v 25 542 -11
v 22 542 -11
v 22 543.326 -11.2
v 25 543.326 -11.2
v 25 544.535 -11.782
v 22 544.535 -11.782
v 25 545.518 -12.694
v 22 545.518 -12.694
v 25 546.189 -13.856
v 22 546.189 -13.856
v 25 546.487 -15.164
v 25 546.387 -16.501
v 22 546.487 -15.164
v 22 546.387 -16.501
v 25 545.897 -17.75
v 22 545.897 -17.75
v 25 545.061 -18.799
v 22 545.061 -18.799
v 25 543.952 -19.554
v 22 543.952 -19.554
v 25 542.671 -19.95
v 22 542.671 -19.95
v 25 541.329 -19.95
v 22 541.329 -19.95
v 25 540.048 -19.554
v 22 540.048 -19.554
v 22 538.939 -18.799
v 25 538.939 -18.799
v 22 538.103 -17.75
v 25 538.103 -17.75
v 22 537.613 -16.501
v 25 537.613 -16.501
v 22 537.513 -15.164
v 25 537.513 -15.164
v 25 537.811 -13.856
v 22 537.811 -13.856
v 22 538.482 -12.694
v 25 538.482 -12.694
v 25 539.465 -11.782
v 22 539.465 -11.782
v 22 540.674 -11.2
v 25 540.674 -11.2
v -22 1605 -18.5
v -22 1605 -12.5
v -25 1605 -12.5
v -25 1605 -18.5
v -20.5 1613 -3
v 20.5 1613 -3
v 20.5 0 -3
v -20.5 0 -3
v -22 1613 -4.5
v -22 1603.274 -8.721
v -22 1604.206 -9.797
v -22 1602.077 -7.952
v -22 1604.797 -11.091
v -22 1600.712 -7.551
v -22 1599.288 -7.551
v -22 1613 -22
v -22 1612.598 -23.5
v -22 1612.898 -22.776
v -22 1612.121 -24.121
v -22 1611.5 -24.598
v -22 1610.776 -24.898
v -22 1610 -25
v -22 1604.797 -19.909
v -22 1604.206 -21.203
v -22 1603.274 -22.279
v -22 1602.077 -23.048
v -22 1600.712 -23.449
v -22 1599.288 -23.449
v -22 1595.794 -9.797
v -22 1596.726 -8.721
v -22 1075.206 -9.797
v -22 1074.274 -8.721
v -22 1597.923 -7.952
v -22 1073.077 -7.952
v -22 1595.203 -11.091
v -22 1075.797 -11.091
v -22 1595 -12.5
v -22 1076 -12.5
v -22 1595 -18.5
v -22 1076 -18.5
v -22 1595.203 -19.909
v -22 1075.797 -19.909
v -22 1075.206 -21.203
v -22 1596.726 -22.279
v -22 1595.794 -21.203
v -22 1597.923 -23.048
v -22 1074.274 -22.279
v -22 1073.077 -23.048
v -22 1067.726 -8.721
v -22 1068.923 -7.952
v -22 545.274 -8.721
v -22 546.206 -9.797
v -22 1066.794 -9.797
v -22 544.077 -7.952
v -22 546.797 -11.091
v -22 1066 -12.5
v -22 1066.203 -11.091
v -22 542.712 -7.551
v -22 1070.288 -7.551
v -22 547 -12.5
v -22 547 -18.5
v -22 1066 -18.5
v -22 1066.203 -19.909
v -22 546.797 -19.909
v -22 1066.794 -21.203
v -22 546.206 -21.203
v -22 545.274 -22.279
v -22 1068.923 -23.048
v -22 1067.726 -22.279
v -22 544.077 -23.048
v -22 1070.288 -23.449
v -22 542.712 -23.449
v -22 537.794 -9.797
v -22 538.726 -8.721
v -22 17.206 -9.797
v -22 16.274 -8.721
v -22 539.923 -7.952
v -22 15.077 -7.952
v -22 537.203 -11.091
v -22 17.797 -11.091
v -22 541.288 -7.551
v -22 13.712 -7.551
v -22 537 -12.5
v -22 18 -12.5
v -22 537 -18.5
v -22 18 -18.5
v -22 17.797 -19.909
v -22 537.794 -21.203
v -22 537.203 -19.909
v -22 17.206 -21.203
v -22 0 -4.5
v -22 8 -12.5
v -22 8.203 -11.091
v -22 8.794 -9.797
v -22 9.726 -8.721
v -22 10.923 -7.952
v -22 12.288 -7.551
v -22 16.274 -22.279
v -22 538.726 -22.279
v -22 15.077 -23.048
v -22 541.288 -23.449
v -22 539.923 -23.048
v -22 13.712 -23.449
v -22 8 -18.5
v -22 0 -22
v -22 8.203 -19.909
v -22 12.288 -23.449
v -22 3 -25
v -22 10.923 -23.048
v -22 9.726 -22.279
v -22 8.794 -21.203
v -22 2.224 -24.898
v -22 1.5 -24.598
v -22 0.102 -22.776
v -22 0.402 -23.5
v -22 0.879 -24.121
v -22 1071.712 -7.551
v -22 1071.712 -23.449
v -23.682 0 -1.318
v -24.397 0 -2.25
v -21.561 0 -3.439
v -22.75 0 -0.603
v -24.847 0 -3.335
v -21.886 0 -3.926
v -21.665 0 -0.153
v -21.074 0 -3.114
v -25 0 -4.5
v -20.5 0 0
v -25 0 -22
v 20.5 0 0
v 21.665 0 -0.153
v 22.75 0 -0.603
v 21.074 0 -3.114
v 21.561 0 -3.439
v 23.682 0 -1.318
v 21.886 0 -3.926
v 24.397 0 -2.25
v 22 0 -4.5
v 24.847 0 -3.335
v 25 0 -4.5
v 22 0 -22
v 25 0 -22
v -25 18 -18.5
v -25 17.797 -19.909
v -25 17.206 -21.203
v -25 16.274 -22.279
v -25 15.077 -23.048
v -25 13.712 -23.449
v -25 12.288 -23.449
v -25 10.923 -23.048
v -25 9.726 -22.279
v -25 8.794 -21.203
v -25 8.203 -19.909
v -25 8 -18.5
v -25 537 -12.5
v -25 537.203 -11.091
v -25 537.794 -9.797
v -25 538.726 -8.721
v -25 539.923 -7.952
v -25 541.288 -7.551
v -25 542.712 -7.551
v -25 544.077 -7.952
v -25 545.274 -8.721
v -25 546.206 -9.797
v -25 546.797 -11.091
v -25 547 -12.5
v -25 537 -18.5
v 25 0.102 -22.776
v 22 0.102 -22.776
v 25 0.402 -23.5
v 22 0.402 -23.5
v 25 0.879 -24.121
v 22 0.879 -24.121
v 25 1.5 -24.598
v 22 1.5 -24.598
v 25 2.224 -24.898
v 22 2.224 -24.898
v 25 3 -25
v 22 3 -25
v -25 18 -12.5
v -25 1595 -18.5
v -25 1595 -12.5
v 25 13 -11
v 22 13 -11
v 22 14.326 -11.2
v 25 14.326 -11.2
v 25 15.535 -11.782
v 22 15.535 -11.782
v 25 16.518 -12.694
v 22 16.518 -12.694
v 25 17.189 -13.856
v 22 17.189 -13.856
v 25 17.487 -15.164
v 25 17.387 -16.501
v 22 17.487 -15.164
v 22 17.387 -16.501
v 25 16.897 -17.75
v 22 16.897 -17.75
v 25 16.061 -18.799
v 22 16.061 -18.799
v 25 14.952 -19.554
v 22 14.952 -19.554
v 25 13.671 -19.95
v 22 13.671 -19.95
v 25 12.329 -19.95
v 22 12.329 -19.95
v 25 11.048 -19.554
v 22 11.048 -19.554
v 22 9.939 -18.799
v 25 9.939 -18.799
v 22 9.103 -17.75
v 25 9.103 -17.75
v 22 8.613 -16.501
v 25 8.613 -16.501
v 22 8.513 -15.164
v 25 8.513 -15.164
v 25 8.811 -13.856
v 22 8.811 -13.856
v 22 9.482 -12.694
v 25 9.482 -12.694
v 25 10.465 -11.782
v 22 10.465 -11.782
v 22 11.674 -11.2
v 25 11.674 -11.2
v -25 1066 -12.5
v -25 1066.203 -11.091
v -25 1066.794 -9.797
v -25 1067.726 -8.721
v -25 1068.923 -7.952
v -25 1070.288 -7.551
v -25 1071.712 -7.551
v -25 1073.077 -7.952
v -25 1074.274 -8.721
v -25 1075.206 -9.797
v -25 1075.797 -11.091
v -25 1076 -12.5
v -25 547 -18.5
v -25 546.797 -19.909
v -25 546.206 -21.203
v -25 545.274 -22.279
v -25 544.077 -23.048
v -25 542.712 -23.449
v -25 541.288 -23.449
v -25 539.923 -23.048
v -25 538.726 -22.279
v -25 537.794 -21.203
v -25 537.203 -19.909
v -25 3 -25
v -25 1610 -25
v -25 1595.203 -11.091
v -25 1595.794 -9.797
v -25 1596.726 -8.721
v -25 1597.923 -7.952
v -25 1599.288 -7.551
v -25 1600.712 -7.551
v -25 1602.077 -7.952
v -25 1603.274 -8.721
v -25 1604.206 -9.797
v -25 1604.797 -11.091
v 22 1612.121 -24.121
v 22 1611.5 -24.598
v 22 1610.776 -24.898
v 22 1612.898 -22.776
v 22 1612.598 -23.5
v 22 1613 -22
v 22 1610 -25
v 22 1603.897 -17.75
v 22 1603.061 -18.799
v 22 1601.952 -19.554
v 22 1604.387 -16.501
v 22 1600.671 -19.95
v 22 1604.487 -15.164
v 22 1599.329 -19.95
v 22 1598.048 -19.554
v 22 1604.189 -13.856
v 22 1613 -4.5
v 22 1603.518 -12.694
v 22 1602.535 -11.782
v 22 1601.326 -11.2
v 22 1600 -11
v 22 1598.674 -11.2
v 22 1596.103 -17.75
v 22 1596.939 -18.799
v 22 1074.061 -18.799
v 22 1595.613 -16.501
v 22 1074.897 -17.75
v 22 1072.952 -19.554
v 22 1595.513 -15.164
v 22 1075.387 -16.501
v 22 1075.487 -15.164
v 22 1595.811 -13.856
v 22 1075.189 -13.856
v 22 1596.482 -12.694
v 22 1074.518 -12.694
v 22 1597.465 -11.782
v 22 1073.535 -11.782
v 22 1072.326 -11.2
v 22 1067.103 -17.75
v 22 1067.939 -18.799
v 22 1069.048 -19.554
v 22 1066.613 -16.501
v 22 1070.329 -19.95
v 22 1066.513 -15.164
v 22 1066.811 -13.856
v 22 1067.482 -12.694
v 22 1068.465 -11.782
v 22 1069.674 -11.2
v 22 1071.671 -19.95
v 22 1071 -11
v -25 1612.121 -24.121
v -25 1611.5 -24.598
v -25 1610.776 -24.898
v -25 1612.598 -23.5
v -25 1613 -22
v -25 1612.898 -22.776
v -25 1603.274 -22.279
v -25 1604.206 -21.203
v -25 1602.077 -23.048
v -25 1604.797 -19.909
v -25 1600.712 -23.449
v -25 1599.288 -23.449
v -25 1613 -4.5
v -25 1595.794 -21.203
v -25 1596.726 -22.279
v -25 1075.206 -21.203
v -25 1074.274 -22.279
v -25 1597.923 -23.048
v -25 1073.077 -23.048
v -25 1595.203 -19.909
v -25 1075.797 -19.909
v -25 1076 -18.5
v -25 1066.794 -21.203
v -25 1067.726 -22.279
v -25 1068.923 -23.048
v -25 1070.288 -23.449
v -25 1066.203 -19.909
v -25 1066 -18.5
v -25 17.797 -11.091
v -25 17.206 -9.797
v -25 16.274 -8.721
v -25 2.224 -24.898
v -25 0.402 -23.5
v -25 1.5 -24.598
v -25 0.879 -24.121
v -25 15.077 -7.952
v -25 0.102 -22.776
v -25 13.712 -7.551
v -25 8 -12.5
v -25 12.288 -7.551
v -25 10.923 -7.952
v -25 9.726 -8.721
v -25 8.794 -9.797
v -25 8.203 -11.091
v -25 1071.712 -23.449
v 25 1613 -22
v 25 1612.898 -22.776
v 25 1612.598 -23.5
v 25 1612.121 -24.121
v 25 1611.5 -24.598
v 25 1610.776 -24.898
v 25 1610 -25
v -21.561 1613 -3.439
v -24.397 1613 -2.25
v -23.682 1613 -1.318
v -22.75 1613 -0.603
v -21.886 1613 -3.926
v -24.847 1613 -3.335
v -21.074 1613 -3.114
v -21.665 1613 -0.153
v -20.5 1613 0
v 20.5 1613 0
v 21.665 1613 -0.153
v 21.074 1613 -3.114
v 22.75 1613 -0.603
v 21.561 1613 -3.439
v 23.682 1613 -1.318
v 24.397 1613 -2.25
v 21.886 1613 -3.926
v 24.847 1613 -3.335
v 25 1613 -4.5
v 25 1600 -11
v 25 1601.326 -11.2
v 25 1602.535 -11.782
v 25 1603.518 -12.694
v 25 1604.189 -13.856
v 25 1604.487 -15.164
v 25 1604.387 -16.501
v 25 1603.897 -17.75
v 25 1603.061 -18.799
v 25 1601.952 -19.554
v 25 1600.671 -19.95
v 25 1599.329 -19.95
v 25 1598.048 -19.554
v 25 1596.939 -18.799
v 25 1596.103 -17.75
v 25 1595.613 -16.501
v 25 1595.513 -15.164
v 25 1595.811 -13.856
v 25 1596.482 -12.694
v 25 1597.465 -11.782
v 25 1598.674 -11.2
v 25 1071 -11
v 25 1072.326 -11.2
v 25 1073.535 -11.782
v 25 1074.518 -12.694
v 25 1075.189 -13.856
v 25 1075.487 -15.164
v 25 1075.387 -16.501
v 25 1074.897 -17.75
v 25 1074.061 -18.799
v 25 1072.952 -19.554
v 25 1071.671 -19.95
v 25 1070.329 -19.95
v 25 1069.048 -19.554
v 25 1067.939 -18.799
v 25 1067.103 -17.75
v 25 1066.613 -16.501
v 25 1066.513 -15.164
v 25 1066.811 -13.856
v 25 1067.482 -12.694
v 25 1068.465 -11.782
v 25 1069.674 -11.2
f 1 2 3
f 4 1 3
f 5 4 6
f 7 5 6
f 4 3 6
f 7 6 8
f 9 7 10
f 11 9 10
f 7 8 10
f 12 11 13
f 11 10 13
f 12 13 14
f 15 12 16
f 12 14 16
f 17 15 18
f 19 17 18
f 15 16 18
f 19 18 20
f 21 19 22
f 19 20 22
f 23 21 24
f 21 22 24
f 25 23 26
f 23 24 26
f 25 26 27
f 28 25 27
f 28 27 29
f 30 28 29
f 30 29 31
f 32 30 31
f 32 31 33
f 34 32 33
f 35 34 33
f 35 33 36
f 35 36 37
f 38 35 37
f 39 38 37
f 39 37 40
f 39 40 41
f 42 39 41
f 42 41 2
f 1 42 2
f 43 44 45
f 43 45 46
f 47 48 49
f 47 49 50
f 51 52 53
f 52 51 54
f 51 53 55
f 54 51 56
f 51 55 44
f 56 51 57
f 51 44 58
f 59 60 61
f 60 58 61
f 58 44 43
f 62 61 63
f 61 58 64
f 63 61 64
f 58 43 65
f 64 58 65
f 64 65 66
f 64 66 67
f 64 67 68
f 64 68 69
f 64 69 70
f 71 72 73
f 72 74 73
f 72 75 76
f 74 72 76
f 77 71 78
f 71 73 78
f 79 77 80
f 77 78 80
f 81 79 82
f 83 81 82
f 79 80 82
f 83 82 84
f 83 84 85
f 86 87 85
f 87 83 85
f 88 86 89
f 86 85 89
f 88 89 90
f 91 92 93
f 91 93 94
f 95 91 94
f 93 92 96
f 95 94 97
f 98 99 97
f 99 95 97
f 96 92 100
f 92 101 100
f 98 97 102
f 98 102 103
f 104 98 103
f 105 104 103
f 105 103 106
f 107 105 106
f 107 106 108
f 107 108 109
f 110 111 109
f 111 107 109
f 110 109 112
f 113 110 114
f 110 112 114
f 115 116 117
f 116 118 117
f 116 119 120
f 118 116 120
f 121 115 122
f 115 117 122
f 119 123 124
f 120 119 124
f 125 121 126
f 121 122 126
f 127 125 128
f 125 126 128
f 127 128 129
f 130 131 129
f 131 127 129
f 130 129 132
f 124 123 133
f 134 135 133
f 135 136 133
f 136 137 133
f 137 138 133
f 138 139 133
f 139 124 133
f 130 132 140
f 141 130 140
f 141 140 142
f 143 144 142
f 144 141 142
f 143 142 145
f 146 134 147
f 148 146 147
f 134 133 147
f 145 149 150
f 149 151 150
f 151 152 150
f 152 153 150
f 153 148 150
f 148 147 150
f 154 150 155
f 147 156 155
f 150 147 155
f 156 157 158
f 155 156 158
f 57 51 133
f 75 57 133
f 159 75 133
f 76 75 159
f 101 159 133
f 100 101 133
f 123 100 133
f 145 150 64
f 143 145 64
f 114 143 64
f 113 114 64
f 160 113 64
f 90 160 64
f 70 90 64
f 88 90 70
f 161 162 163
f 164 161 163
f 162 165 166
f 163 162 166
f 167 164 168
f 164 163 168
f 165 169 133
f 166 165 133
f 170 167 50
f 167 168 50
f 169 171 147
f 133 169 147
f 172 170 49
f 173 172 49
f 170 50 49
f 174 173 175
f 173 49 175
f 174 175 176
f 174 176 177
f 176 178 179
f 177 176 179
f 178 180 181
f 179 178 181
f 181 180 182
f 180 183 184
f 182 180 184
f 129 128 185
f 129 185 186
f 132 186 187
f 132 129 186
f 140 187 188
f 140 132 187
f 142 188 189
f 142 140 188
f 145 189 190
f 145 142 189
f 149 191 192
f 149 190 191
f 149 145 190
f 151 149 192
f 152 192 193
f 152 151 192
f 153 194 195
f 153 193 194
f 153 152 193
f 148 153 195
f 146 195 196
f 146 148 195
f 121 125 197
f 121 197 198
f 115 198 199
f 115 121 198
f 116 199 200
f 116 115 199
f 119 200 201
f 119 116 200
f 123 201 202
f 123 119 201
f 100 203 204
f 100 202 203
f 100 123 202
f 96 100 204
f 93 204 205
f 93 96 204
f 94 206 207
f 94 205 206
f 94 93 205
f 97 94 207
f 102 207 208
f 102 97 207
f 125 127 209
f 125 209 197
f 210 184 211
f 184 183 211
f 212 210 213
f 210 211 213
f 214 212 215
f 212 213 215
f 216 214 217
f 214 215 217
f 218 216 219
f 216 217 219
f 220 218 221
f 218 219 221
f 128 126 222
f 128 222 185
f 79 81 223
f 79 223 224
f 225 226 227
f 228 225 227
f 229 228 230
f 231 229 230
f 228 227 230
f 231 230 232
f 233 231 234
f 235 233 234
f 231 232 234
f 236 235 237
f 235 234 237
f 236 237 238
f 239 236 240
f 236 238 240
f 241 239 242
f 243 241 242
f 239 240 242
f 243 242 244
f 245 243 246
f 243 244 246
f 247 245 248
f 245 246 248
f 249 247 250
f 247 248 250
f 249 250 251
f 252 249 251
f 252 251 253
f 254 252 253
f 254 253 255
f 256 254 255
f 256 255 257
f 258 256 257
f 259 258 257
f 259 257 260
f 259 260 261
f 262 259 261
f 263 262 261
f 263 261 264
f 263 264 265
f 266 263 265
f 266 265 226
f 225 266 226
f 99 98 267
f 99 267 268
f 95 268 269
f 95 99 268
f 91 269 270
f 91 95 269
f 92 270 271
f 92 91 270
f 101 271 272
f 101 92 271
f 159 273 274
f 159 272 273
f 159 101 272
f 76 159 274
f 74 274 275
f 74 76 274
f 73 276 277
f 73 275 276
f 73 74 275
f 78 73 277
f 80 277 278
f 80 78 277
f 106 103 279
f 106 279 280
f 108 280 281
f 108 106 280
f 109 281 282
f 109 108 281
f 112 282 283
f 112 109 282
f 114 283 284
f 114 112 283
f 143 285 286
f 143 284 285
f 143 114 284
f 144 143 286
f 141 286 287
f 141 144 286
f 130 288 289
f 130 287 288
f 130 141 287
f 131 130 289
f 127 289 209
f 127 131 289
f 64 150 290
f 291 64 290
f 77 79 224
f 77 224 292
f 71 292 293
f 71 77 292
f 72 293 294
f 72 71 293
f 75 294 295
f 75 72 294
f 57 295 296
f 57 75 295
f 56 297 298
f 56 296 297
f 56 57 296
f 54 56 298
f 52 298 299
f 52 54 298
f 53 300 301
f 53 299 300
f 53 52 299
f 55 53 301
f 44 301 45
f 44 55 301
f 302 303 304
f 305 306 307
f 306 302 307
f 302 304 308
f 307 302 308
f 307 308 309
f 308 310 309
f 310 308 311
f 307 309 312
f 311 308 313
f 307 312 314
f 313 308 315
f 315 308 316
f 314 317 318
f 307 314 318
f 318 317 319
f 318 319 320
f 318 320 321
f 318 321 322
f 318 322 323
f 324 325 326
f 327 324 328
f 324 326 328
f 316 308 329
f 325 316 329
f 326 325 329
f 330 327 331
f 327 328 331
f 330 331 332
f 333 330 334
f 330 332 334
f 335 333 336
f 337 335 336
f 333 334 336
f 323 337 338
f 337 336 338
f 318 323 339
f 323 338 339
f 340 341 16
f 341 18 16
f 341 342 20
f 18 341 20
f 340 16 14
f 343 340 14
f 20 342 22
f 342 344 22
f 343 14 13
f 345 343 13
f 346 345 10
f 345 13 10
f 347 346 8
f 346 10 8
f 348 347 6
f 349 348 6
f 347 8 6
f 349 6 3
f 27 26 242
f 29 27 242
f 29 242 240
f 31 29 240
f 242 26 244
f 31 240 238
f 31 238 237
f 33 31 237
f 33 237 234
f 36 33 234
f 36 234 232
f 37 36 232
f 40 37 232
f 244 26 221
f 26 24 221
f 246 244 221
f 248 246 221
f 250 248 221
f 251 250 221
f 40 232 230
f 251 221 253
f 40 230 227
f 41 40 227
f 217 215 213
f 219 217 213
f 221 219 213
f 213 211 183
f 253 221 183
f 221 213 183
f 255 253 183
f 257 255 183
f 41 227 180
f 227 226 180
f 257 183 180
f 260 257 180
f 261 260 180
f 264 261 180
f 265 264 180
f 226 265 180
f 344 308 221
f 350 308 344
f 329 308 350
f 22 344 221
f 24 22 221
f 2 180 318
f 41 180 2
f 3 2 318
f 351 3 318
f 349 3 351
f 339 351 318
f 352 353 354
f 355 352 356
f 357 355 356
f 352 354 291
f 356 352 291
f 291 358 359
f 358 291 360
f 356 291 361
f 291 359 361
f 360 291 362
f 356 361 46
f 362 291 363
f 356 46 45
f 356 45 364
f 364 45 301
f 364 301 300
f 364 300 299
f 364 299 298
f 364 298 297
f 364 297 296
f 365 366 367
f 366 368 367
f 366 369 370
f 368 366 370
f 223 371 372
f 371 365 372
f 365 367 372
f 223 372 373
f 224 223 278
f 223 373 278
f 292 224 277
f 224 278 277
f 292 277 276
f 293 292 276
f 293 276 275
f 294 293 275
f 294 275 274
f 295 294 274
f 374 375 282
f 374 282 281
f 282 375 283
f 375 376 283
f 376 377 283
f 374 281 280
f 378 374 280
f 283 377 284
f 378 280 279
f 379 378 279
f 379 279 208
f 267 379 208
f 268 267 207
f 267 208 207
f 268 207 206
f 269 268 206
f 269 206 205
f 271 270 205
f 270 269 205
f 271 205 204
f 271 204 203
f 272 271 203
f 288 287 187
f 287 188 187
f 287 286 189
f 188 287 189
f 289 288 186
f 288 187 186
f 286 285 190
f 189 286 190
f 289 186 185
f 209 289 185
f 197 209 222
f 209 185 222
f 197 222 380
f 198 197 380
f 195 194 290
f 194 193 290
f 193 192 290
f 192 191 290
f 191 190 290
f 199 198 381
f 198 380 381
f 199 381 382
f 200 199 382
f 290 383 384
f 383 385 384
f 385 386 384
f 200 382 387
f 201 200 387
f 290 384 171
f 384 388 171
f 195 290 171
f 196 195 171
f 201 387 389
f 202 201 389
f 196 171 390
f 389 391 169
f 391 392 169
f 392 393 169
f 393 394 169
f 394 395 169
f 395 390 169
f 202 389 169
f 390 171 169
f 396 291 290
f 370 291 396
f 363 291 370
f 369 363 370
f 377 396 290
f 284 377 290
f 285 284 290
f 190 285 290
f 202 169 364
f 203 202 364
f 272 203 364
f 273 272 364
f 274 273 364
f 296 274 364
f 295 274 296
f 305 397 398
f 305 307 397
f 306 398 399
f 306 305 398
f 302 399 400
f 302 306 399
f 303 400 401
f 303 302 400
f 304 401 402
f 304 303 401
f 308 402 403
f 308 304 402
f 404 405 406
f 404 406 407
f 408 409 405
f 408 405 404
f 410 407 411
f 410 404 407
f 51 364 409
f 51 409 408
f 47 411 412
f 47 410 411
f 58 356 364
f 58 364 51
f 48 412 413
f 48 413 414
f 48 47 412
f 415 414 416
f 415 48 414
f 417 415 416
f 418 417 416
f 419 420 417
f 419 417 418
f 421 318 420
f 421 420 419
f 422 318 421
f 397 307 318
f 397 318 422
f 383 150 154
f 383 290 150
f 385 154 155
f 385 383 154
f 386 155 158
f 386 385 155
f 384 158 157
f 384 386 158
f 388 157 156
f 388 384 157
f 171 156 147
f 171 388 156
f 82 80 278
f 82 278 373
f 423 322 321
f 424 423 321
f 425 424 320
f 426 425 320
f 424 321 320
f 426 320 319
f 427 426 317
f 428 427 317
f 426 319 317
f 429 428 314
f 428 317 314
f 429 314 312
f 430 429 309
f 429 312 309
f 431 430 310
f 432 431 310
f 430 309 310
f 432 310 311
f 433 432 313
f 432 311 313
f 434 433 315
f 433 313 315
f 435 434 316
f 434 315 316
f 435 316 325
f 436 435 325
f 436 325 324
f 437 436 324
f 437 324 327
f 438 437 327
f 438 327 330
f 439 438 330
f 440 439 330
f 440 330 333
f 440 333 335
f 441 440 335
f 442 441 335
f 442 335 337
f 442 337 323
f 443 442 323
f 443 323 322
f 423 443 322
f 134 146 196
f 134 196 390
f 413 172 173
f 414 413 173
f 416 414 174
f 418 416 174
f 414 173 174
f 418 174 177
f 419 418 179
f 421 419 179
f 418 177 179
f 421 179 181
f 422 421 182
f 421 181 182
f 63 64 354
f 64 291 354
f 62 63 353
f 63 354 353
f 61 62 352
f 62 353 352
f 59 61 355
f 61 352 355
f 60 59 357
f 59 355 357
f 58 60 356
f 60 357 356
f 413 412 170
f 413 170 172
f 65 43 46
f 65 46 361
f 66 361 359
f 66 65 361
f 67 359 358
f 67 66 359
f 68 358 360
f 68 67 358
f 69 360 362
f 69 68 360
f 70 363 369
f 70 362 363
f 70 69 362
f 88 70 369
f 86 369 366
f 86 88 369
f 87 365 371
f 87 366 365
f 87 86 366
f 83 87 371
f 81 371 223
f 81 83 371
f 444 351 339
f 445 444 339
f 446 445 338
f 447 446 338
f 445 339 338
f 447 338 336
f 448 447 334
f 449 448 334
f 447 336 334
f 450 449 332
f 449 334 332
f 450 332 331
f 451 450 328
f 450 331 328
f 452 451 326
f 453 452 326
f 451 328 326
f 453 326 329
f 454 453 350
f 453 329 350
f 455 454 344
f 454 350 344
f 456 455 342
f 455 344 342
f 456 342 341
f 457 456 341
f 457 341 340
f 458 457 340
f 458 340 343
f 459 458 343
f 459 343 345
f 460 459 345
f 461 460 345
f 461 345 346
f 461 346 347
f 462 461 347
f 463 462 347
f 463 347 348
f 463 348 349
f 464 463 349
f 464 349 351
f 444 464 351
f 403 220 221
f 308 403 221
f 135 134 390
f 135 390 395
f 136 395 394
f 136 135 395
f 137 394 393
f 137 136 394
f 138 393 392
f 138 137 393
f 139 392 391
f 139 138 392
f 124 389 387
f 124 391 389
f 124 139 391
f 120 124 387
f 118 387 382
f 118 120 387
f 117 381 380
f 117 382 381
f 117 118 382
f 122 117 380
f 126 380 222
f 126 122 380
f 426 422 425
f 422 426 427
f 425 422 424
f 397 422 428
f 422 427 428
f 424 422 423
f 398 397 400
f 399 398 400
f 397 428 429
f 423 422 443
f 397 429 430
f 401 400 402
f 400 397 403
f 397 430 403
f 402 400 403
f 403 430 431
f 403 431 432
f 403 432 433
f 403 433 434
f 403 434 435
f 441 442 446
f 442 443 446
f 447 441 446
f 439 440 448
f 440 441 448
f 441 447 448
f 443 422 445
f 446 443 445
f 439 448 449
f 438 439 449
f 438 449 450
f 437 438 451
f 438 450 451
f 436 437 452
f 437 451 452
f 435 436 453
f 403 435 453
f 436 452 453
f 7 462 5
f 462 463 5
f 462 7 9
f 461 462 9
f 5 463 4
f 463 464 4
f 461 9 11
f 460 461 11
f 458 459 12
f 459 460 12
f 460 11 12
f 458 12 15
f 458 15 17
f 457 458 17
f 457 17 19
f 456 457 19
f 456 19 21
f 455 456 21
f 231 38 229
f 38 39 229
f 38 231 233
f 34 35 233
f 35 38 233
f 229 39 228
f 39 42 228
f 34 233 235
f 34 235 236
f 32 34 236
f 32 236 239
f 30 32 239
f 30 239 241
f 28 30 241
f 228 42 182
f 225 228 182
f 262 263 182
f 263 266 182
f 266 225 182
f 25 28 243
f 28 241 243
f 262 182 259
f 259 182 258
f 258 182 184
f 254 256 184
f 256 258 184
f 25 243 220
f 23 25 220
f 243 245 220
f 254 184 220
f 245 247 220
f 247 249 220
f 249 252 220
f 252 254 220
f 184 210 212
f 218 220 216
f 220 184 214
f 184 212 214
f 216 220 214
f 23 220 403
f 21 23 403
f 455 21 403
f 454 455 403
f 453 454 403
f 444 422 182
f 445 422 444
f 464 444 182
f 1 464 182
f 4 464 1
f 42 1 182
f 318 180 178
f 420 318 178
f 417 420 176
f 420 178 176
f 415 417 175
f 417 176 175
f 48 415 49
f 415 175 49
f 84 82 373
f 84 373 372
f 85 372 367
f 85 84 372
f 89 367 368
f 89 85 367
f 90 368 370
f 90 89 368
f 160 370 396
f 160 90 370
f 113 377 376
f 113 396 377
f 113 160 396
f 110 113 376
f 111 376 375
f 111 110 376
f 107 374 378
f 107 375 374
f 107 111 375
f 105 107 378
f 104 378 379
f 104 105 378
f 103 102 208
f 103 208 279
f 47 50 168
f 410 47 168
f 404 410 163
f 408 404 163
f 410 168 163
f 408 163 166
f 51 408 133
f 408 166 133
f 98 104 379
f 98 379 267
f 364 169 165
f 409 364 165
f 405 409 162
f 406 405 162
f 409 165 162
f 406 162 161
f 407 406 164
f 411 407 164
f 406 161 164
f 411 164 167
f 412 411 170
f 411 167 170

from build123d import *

# Parameters (mm, degrees)
BASE_FLANGE1_DEPTH = 1613
CUT_EXTRUDE1_REACH = 1615.878
FILLET1_R          = 3
CUT_EXTRUDE2_REACH = 1615.878
SKETCH7_R          = 4.5
LPATTERN1_COUNT    = 4
LPATTERN1_PITCH    = 529


# Sheet-metal steps are written as plain solids
with BuildPart() as part:
    # Sketch1 → Base-Flange1 (new body)
    with BuildSketch(Plane(origin=(0, 0, 0), x_dir=(1, 0, 0), z_dir=(0, 1, 0))):
        with BuildLine():
            Line((-25, 25), (-25, 4.5))
            ThreePointArc((-25, 4.5), (-23.681980515, 1.318019485), (-20.5, 0))
            Line((-20.5, 0), (20.5, 0))
            ThreePointArc((20.5, 0), (23.681980515, 1.318019485), (25, 4.5))
            Line((25, 4.5), (25, 25))
            Line((25, 25), (22, 25))
            Line((22, 25), (22, 4.5))
            ThreePointArc((22, 4.5), (21.560660172, 3.439339828), (20.5, 3))
            Line((20.5, 3), (-20.5, 3))
            ThreePointArc((-20.5, 3), (-21.560660172, 3.439339828), (-22, 4.5))
            Line((-22, 4.5), (-22, 25))
            Line((-22, 25), (-25, 25))
        make_face()
    extrude(amount=BASE_FLANGE1_DEPTH)

    # Sketch6 → Cut-Extrude1 (cut, up to next)
    with BuildSketch(Plane(origin=(-22, 0, 0), x_dir=(0, 0, -1), z_dir=(1, 0, 0)), mode=Mode.PRIVATE) as cut_extrude1_sk1:
        with BuildLine():
            Line((12.5, 18), (18.5, 18))
            ThreePointArc((18.5, 18), (23.5, 13), (18.5, 8))
            Line((18.5, 8), (12.5, 8))
            ThreePointArc((12.5, 8), (7.5, 13), (12.5, 18))
        make_face()
    cut_extrude1_tool1 = extrude(cut_extrude1_sk1.sketch, amount=-CUT_EXTRUDE1_REACH, mode=Mode.PRIVATE) & part.part
    cut_extrude1 = cut_extrude1_tool1.solids().sort_by_distance((-22, 13, -15.5))[0]
    add(cut_extrude1, mode=Mode.SUBTRACT)

    # Fillet1
    fillet1_edges = [part.edges().sort_by_distance(p)[0] for p in [
        (23.5, 0, -25),
        (-23.5, 0, -25),
        (23.5, 1613, -25),
        (-23.5, 1613, -25),
    ]]
    fillet(fillet1_edges, radius=FILLET1_R)

    # Sketch7 → Cut-Extrude2 (cut, up to next)
    with BuildSketch(Plane.ZY.offset(-22), mode=Mode.PRIVATE) as cut_extrude2_sk1:
        with Locations((-15.5, 13)):
            Circle(SKETCH7_R)
    cut_extrude2_tool1 = extrude(cut_extrude2_sk1.sketch, amount=-CUT_EXTRUDE2_REACH, mode=Mode.PRIVATE) & part.part
    cut_extrude2 = cut_extrude2_tool1.solids().sort_by_distance((22, 13, -15.5))[0]
    add(cut_extrude2, mode=Mode.SUBTRACT)

    # LPattern1: Cut-Extrude1, Cut-Extrude2 ×4
    with Locations(*[(0, i * LPATTERN1_PITCH, 0) for i in range(1, LPATTERN1_COUNT)]):
        add(cut_extrude1, mode=Mode.SUBTRACT)
        add(cut_extrude2, mode=Mode.SUBTRACT)


solid = part.part
